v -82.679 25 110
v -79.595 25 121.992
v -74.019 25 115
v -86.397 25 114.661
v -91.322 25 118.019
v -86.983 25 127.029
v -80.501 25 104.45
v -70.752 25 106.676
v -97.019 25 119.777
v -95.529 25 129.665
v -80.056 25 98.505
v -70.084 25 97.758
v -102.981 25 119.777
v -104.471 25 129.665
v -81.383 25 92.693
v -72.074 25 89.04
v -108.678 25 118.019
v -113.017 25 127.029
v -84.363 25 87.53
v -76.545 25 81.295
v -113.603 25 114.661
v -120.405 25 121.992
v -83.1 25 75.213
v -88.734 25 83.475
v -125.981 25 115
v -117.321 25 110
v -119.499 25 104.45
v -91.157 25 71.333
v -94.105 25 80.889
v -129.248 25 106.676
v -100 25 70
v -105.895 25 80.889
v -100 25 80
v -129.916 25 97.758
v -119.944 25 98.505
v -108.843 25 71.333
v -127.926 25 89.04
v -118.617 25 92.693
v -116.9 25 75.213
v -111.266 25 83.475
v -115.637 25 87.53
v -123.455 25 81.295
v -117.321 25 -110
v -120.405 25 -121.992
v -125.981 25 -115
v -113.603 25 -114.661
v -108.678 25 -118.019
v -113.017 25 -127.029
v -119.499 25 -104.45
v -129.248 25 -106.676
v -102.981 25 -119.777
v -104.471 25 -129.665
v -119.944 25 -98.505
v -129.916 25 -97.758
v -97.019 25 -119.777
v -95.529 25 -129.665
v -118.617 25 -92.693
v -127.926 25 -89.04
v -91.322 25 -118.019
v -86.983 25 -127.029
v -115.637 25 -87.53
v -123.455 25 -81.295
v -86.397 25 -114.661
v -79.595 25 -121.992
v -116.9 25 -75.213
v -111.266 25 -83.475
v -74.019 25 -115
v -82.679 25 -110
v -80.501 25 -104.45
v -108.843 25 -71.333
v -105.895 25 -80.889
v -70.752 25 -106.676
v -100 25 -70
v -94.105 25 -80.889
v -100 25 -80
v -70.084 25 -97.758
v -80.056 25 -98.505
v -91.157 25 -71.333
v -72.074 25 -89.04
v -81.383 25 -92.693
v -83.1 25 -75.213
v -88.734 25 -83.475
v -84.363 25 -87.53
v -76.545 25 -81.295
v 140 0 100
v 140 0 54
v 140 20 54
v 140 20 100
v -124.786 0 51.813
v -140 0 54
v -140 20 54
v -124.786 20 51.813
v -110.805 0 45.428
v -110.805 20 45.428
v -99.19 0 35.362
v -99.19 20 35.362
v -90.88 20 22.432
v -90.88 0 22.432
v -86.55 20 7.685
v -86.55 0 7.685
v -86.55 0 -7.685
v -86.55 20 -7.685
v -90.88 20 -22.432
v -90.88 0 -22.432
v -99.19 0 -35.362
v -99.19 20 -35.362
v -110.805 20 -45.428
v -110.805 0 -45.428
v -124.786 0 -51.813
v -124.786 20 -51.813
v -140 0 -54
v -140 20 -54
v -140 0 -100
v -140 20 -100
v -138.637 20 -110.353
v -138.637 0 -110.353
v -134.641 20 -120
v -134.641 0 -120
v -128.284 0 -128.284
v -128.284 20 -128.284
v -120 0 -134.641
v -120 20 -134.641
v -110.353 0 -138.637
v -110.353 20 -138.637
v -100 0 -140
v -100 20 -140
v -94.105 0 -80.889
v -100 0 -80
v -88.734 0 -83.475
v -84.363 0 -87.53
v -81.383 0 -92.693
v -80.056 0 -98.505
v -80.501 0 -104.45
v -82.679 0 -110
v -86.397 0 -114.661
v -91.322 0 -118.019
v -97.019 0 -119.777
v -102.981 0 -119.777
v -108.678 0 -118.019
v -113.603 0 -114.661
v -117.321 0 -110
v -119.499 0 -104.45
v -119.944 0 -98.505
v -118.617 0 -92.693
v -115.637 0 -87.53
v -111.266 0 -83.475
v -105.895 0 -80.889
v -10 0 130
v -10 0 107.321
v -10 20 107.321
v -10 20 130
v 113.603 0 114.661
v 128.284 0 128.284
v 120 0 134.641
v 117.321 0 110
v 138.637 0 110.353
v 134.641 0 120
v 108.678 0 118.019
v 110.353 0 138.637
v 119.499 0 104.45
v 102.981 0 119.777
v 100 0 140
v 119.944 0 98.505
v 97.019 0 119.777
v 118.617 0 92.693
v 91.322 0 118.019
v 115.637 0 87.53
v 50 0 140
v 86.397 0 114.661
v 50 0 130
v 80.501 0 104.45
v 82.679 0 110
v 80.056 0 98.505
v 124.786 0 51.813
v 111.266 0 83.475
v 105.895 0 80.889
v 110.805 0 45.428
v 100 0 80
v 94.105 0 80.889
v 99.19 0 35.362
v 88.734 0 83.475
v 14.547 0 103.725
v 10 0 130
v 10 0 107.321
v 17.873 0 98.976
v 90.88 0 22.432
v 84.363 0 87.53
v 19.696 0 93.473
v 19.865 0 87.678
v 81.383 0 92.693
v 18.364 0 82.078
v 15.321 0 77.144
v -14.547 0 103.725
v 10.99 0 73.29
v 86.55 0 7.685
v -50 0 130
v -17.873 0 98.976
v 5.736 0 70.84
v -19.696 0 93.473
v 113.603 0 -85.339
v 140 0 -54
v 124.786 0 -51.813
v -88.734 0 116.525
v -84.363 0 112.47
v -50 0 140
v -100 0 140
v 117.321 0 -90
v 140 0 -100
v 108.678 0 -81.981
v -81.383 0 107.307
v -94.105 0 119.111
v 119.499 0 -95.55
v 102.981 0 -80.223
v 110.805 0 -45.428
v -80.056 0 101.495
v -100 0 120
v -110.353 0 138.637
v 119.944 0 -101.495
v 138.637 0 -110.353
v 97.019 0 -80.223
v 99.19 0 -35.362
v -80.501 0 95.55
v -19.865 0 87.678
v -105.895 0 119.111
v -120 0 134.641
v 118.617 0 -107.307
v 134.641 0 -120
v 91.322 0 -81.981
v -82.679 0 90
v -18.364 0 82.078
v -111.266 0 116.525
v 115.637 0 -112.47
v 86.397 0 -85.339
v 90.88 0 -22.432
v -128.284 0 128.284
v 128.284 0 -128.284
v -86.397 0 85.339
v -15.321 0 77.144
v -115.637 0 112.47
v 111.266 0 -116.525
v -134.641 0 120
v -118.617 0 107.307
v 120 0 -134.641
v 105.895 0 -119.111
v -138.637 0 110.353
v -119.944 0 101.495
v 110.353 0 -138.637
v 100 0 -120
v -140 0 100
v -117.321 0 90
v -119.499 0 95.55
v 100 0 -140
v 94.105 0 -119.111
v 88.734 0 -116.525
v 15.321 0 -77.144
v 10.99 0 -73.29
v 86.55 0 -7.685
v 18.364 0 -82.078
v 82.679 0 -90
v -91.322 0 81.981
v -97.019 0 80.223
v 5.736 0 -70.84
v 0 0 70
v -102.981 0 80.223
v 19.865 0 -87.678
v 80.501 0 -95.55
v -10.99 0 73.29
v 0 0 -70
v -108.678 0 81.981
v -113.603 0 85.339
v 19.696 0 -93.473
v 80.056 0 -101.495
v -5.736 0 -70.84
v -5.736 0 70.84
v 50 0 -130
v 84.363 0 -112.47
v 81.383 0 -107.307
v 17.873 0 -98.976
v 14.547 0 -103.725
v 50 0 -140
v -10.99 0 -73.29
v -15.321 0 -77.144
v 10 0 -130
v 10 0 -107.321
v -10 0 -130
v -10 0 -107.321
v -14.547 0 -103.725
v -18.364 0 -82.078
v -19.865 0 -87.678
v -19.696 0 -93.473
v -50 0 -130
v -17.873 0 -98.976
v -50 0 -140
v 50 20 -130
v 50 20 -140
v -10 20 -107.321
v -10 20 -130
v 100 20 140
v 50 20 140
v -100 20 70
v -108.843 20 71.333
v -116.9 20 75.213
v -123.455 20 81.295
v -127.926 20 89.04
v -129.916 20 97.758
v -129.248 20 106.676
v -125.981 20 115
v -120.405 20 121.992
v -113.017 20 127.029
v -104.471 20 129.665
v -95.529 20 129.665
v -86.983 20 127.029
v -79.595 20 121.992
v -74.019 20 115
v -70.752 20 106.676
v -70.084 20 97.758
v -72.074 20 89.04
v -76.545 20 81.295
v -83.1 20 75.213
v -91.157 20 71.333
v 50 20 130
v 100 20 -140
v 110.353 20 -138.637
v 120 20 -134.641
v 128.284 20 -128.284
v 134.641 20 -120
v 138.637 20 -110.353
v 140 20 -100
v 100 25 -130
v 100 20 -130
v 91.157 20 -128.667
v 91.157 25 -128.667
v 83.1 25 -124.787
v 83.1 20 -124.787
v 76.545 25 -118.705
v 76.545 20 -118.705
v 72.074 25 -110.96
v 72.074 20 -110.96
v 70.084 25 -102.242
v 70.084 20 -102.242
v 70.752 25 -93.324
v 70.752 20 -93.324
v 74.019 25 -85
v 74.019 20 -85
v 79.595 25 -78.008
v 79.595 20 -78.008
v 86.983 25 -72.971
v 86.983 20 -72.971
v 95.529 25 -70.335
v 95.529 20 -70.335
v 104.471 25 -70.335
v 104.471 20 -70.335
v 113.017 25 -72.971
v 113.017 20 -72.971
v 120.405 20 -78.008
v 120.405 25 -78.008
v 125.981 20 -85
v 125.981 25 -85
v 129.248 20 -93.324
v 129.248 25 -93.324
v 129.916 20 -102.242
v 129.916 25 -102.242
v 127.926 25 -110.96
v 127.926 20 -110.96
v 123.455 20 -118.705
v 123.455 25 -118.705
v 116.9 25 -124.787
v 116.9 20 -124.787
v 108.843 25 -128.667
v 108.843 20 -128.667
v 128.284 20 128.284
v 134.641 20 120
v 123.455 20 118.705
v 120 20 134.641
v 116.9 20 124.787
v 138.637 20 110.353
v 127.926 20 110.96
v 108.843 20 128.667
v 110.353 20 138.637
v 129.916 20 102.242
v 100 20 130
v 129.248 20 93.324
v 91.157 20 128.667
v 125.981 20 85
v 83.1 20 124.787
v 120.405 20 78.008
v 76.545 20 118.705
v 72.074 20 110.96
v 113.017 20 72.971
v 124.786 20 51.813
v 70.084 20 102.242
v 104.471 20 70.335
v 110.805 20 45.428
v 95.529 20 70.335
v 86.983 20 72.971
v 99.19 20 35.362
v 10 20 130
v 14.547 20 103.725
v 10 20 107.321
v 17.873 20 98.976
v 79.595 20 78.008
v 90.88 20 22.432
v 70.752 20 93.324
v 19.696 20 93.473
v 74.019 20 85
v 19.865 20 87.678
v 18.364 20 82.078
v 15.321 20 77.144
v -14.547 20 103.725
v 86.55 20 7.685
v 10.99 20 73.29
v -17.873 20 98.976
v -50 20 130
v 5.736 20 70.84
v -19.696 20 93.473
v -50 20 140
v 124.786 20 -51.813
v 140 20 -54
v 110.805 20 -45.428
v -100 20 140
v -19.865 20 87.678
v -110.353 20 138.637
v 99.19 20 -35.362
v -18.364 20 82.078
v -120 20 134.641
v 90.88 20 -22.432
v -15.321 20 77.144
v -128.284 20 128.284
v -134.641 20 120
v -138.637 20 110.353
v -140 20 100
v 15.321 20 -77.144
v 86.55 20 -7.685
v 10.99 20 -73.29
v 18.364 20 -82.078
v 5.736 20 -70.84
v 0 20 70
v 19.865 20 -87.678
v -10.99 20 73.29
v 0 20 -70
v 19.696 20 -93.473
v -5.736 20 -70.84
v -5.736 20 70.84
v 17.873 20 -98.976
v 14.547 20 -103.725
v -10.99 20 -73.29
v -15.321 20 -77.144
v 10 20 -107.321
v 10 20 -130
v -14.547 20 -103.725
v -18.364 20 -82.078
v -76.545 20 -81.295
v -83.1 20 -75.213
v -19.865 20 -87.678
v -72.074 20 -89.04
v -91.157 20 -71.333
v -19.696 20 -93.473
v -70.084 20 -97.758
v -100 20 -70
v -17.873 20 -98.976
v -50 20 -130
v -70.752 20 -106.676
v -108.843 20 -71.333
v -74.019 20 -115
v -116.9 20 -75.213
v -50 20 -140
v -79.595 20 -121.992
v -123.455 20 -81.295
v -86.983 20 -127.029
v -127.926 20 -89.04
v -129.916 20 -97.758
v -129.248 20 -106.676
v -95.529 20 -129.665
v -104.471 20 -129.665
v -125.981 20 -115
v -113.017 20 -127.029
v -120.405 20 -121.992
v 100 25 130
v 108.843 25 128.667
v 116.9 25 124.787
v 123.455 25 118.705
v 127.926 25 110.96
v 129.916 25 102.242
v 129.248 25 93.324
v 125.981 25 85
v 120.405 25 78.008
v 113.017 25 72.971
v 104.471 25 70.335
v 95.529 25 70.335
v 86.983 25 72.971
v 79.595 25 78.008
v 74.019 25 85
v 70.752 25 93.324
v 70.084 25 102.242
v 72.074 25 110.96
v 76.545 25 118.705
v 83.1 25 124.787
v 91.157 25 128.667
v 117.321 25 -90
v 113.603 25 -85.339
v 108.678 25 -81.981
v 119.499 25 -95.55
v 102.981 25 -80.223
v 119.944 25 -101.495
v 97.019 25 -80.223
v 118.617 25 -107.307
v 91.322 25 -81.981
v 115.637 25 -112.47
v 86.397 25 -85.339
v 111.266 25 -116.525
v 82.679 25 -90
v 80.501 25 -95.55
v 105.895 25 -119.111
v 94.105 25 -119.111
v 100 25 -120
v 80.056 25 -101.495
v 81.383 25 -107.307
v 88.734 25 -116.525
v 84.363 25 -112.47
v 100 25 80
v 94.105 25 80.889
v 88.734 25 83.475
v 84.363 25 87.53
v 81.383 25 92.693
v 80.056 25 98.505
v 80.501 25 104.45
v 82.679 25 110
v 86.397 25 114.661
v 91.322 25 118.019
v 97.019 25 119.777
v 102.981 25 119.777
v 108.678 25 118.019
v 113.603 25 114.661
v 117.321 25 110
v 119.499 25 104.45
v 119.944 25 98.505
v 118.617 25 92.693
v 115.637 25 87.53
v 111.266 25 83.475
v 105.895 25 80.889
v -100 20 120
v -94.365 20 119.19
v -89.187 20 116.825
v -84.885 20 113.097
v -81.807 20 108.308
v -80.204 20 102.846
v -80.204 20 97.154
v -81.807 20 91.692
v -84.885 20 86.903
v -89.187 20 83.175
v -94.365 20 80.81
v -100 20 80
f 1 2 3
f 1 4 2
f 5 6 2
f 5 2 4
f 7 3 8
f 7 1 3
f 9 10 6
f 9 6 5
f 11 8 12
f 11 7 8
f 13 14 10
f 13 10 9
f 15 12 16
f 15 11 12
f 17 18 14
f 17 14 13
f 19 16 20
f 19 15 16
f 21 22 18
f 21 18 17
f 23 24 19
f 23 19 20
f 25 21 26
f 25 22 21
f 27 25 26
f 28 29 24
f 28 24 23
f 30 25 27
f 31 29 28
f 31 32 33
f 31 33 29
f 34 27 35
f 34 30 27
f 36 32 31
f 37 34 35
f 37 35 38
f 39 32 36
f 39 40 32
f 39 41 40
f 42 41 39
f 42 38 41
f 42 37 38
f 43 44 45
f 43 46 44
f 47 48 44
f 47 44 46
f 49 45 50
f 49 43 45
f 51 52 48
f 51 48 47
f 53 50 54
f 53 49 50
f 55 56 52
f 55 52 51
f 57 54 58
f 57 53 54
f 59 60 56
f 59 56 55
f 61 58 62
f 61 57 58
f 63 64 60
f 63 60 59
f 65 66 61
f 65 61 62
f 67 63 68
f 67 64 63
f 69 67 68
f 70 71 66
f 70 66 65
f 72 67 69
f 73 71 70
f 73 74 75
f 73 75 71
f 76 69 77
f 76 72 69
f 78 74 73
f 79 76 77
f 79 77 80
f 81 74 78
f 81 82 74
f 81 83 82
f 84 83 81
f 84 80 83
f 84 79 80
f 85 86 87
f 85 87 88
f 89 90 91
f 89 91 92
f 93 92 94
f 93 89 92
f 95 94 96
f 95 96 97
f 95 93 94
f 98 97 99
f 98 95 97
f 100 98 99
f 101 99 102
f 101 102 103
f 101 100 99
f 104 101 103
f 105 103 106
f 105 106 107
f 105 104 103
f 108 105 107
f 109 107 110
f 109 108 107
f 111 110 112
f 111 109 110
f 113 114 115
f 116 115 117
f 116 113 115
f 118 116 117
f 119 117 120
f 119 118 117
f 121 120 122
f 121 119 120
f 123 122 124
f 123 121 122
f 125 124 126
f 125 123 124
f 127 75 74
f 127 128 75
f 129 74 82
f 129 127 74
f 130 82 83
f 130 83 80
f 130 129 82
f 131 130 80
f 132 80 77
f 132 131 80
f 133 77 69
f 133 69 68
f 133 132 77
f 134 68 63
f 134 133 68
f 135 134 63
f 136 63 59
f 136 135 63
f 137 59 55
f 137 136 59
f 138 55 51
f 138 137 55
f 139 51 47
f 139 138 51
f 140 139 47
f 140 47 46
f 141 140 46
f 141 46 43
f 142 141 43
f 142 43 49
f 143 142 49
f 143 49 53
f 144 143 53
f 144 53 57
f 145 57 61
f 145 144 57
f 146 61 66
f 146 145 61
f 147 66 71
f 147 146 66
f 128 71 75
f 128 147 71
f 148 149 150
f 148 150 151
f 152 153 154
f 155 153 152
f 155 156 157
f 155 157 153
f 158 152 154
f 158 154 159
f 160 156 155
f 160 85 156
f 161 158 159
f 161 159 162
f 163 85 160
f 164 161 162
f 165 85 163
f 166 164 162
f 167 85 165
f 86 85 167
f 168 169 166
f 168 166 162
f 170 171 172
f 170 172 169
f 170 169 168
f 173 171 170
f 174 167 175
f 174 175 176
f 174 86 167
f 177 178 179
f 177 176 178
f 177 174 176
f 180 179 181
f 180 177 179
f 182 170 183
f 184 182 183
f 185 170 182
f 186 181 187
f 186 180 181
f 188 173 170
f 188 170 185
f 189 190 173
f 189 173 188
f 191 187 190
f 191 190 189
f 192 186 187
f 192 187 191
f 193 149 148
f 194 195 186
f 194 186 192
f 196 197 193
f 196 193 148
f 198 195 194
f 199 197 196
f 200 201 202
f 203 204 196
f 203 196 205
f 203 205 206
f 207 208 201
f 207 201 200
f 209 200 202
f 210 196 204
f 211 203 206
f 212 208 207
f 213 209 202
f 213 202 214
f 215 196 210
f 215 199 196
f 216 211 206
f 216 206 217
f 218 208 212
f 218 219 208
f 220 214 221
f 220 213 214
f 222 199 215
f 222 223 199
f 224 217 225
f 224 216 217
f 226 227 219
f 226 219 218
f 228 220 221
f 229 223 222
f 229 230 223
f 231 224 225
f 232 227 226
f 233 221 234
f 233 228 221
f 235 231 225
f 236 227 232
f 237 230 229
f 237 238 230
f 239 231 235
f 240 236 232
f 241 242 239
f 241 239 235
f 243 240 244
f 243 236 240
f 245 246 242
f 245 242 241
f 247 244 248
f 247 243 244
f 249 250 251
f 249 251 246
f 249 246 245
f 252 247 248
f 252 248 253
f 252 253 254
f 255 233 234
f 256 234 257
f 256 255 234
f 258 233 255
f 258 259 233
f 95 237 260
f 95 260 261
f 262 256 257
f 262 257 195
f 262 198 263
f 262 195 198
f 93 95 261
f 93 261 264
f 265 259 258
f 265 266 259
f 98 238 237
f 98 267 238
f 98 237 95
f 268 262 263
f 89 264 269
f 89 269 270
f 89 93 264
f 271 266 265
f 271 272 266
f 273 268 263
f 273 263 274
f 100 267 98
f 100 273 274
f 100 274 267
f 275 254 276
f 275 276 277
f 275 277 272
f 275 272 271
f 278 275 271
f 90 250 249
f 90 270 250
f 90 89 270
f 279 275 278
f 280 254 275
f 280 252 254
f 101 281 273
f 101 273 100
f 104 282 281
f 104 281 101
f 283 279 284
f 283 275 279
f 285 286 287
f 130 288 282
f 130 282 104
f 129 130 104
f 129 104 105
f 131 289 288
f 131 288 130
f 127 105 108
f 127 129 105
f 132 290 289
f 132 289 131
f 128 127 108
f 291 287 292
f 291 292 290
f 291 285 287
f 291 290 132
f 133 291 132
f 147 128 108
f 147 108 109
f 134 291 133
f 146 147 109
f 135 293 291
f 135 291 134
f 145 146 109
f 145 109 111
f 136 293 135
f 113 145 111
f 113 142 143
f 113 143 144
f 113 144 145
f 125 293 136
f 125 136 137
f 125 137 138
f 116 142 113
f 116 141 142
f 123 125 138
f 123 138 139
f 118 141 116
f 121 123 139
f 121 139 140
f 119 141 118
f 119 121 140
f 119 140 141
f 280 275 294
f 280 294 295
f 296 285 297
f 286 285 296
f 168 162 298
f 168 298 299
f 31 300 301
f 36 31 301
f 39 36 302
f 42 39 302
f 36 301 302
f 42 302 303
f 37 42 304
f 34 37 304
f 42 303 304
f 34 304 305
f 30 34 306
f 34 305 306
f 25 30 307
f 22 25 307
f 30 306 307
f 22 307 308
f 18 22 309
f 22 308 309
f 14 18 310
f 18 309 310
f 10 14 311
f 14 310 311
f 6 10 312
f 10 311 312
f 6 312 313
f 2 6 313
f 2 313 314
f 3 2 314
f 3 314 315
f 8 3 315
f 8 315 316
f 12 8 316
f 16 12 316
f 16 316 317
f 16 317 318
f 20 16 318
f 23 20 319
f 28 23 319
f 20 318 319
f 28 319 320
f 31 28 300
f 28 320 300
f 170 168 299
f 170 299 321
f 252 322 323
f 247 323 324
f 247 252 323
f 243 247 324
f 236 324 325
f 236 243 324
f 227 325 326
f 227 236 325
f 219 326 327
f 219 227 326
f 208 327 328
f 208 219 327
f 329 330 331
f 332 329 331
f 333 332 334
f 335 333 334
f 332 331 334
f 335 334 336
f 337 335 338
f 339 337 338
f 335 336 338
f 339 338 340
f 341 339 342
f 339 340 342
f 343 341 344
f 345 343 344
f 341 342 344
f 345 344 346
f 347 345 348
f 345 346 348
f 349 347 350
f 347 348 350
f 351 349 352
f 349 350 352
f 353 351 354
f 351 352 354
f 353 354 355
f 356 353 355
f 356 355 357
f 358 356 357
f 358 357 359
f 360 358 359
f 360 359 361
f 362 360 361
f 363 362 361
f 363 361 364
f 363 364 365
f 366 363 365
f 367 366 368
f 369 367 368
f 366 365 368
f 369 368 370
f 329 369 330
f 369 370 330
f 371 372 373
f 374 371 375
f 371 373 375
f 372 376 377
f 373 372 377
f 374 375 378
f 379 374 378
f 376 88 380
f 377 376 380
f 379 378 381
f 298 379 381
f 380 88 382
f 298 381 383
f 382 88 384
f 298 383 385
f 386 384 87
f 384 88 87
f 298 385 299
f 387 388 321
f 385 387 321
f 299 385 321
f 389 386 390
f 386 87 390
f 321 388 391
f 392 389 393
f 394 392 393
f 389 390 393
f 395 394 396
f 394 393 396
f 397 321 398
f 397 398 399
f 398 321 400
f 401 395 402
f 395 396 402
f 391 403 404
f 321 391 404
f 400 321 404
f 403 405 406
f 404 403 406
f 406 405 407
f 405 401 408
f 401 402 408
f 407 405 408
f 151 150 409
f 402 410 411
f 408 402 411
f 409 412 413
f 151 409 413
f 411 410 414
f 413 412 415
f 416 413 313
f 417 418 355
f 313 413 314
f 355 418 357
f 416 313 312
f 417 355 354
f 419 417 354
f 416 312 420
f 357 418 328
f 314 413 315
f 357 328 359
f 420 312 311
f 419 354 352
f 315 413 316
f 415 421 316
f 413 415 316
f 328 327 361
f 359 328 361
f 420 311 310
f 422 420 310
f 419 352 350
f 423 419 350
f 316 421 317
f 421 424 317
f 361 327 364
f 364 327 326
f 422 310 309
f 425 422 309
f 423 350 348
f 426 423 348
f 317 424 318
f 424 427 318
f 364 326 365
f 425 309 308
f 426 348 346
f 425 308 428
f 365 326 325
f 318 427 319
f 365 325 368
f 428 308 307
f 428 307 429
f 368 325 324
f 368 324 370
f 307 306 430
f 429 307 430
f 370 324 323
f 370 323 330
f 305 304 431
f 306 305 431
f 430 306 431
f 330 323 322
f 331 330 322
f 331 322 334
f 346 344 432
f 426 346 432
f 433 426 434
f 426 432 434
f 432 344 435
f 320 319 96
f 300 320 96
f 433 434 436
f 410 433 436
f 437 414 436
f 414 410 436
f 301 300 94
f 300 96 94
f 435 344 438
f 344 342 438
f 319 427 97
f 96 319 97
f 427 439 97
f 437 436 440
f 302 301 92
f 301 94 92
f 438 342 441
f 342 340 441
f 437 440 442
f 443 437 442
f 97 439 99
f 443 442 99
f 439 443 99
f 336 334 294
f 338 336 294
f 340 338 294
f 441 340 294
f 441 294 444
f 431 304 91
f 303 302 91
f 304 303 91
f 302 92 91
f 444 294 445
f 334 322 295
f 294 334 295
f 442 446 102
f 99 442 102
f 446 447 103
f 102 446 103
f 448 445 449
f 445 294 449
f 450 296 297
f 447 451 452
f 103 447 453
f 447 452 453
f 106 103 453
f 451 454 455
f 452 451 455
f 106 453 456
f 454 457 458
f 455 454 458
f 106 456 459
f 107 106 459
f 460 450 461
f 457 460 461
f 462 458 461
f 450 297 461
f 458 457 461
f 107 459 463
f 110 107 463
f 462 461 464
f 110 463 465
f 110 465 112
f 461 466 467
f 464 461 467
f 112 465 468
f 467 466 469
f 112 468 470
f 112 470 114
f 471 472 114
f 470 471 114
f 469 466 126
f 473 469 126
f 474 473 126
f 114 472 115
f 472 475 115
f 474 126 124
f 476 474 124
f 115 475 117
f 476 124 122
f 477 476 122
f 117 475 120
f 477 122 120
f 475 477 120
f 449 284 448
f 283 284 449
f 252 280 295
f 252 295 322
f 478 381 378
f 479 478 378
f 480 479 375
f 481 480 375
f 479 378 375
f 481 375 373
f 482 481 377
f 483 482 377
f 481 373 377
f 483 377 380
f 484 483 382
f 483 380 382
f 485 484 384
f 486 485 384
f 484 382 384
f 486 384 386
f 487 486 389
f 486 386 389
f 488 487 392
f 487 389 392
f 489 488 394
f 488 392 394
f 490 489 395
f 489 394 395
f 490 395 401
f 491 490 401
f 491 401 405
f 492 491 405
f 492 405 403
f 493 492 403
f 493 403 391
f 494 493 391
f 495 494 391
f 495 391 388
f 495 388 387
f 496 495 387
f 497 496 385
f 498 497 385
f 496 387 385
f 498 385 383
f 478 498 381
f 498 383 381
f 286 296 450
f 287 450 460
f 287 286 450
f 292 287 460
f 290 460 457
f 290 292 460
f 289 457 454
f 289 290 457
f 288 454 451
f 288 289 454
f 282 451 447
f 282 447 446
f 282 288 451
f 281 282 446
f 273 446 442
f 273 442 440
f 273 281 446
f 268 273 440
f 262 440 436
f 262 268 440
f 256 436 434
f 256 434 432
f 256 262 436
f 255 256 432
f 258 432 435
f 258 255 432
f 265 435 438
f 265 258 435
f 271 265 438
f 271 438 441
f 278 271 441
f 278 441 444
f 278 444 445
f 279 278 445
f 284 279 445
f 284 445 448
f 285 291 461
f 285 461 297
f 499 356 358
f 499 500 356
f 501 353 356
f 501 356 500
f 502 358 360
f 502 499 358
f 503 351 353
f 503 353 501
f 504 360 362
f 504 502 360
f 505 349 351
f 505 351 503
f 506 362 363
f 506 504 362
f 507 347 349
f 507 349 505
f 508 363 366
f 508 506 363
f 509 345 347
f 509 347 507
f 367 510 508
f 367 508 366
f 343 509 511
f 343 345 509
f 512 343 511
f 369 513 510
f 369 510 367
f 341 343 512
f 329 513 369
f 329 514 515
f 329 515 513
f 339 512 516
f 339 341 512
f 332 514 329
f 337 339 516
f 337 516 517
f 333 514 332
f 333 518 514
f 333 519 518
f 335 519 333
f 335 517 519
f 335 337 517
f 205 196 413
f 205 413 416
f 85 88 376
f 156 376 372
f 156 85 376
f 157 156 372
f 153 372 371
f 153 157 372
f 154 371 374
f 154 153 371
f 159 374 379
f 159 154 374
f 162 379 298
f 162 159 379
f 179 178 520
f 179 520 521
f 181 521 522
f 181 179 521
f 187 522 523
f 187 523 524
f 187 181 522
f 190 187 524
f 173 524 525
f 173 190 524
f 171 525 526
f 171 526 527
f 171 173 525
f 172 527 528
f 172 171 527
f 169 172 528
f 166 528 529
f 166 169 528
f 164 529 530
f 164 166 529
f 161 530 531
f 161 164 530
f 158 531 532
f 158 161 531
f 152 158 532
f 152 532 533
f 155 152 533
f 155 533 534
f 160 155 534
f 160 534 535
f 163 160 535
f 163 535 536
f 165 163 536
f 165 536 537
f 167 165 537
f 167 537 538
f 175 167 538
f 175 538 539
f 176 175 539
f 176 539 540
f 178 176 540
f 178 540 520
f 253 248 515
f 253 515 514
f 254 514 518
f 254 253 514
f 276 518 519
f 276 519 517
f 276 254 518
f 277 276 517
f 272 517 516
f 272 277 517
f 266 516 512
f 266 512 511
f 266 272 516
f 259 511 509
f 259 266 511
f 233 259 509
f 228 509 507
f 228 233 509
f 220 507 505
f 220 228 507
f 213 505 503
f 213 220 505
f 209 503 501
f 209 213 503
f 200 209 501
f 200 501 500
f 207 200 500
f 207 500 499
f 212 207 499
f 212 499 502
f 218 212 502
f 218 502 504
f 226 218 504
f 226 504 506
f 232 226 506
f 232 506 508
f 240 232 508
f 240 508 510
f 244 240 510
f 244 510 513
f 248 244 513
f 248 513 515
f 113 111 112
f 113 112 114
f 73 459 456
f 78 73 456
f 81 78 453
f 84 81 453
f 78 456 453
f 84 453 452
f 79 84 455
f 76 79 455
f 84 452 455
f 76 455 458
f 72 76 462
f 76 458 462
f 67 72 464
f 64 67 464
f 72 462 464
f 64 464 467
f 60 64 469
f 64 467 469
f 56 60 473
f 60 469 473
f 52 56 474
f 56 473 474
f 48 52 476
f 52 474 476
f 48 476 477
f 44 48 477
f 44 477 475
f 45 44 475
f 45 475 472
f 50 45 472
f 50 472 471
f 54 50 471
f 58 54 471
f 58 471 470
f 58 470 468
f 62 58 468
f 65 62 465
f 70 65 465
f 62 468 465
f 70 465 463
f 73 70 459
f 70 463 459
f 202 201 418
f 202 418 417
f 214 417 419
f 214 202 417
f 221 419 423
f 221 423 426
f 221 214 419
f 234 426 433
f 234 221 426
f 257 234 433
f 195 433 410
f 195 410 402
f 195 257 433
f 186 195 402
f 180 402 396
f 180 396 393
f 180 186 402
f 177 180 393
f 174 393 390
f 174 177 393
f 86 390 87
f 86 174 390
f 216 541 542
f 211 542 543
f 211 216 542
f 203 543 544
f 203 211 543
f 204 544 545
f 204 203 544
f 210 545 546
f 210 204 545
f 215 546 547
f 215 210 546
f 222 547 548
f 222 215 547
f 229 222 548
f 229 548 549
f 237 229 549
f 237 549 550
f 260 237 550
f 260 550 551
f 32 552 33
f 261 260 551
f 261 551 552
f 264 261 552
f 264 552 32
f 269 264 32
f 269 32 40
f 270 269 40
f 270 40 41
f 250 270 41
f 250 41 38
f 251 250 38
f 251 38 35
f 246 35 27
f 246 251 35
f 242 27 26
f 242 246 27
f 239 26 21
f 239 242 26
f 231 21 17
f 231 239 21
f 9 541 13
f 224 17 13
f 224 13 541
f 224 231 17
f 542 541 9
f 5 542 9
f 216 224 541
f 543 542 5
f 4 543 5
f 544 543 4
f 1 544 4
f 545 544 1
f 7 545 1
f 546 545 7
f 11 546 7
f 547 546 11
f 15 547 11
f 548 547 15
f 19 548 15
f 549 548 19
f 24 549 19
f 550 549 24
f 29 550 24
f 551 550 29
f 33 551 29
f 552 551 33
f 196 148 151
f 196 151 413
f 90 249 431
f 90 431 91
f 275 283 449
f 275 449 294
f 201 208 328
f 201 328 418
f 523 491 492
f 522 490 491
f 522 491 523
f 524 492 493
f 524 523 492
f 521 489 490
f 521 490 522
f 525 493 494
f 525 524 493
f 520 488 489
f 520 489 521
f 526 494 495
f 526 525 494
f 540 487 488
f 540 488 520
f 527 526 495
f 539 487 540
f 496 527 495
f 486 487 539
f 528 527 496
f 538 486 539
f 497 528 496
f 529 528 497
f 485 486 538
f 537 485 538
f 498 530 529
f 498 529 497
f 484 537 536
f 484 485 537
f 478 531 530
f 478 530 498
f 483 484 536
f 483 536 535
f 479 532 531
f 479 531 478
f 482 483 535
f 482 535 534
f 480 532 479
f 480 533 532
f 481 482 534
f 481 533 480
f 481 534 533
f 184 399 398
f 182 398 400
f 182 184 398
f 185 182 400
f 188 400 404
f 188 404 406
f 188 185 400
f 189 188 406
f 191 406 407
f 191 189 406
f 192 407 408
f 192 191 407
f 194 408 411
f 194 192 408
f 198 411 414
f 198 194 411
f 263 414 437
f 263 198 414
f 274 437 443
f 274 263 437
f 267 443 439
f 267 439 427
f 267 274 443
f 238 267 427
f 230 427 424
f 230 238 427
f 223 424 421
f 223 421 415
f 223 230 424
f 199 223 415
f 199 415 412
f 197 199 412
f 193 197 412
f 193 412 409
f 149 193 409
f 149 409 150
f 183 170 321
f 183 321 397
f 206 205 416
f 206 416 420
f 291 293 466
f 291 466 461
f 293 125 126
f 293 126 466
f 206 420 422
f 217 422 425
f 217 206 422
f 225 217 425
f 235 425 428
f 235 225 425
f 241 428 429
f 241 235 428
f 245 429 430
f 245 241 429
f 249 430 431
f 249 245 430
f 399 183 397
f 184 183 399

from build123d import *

# Parameters (mm, degrees)
SKETCH1_R           = 20
BOSS_EXTRUDE1_DEPTH = 20
SKETCH2_R           = 30
SKETCH2_R_2         = 20
BOSS_EXTRUDE2_DEPTH = 5


with BuildPart() as part:
    # Sketch1 → Boss-Extrude1 (new body)
    with BuildSketch(Plane(origin=(0, 0, 0), x_dir=(1, 0, 0), z_dir=(0, 1, 0))):
        with BuildLine():
            Line((-100, 140), (-50, 140))
            Line((-50, 140), (-50, 130))
            Line((-50, 130), (-10, 130))
            Line((-10, 130), (-10, 107.320508075))
            ThreePointArc((-10, 107.320508075), (0, 70), (10, 107.320508075))
            Line((10, 107.320508075), (10, 130))
            Line((10, 130), (50, 130))
            Line((50, 130), (50, 140))
            Line((50, 140), (100, 140))
            ThreePointArc((100, 140), (128.284271247, 128.284271247), (140, 100))
            Line((140, 100), (140, 54))
            ThreePointArc((140, 54), (86, 0), (140, -54))
            Line((140, -54), (140, -100))
            ThreePointArc((140, -100), (128.284271247, -128.284271247), (100, -140))
            Line((100, -140), (50, -140))
            Line((50, -140), (50, -130))
            Line((50, -130), (10, -130))
            Line((10, -130), (10, -107.320508076))
            ThreePointArc((10, -107.320508076), (0, -70), (-10, -107.320508076))
            Line((-10, -107.320508076), (-10, -130))
            Line((-10, -130), (-50, -130))
            Line((-50, -130), (-50, -140))
            Line((-50, -140), (-100, -140))
            ThreePointArc((-100, -140), (-128.284271247, -128.284271247), (-140, -100))
            Line((-140, -100), (-140, -54))
            ThreePointArc((-140, -54), (-86, 0), (-140, 54))
            Line((-140, 54), (-140, 100))
            ThreePointArc((-140, 100), (-128.284271247, 128.284271247), (-100, 140))
        make_face()
        with Locations(Location((-100, -100, 0), (0, 0, 270))):
            Circle(SKETCH1_R, mode=Mode.SUBTRACT)
        with Locations(Location((-100, 100, 0), (0, 0, 270))):
            Circle(SKETCH1_R, mode=Mode.SUBTRACT)
        with Locations(Location((100, 100, 0), (0, 0, 90))):
            Circle(SKETCH1_R, mode=Mode.SUBTRACT)
        with Locations(Location((100, -100, 0), (0, 0, 90))):
            Circle(SKETCH1_R, mode=Mode.SUBTRACT)
    extrude(amount=BOSS_EXTRUDE1_DEPTH)

    # Sketch2 → Boss-Extrude2 (add)
    # profile 1 of 4: a face of its own
    with BuildSketch(Plane(origin=(0, 20, 0), x_dir=(1, 0, 0), z_dir=(0, 1, 0))):
        with Locations(Location((-100, 100, 0), (0, 0, 270))):
            Circle(SKETCH2_R)
        with Locations(Location((-100, 100, 0), (0, 0, 270))):
            Circle(SKETCH2_R_2, mode=Mode.SUBTRACT)
    # profile 2 of 4: a face of its own
    with BuildSketch(Plane(origin=(0, 20, 0), x_dir=(1, 0, 0), z_dir=(0, 1, 0))):
        with Locations(Location((100, 100, 0), (0, 0, 90))):
            Circle(SKETCH2_R)
        with Locations(Location((100, 100, 0), (0, 0, 90))):
            Circle(SKETCH2_R_2, mode=Mode.SUBTRACT)
    # profile 3 of 4: a face of its own
    with BuildSketch(Plane(origin=(0, 20, 0), x_dir=(1, 0, 0), z_dir=(0, 1, 0))):
        with Locations(Location((100, -100, 0), (0, 0, 270))):
            Circle(SKETCH2_R)
        with Locations(Location((100, -100, 0), (0, 0, 90))):
            Circle(SKETCH2_R_2, mode=Mode.SUBTRACT)
    # profile 4 of 4: a face of its own
    with BuildSketch(Plane(origin=(0, 20, 0), x_dir=(1, 0, 0), z_dir=(0, 1, 0))):
        with Locations(Location((-100, -100, 0), (0, 0, 90))):
            Circle(SKETCH2_R)
        with Locations(Location((-100, -100, 0), (0, 0, 90))):
            Circle(SKETCH2_R_2, mode=Mode.SUBTRACT)
    extrude(amount=BOSS_EXTRUDE2_DEPTH)


solid = part.part
